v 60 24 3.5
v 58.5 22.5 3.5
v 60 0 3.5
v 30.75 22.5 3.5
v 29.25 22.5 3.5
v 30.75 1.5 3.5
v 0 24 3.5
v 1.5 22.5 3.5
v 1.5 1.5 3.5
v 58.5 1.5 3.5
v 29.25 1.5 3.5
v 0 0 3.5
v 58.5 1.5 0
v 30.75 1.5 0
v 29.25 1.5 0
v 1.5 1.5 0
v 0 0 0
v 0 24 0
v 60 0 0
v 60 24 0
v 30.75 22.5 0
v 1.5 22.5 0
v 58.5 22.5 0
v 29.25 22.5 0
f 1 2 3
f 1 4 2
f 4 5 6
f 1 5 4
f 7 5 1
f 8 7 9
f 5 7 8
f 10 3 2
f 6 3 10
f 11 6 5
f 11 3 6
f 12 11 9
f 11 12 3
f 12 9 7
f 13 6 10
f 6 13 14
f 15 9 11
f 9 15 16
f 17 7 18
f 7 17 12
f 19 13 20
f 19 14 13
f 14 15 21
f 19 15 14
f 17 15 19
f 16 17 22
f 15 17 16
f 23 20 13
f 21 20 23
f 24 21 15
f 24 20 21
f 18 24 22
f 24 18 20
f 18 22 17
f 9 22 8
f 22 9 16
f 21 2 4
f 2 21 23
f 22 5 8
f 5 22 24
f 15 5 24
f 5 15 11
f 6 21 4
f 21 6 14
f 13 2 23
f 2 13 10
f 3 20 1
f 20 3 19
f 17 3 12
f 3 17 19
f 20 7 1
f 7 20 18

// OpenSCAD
//Draw Allted's Simple CNC Table based on input dimensions using openscad
//Translated into openscad on 4/4/2016  by: David Bunch
//
//The default dimensions are what I am using for a table, 48"Long x 36"Wide x 30"High
//This is drawn in Inches, set ScaleFactor variable to 25.4 to draw in millimeters
//Rev2 - revised for Quantity of Top Ledge Lengths if only 1 middle stiffener used
//Rev3 - Legs, Top Ledges & Shelf Ledges can be different Widths & thickness now
//       I made this change because I want to use 2x3's for the Shelf ledges
//Rev4 - Display Shelf Usable Heights with a visual cube for each shelf
//CUSTOMIZER VARIABLES
//If you want your MPCNC corners to be right at corners of table,
//Set Len & Wid the same as your CNC_LEN & CNC_Wid
WorkBenchLength = 5*12;                   //Length of Table
WorkBenchDepth = 24;                      //Width of Table
BoardWidth = 3.5;          //Width Legs (I am using 2x4)
BoardThickness = 1.5;   



RailLength = WorkBenchLength;
BeamLength = WorkBenchDepth-(2*BoardThickness);
NumberOfTopSupportBeams = 1; //Number of Beams for support


Caster_Height = 4;           //how tall are your casters
Total_Height = 36;           //Total height of the table (Including casters)
Ht = Total_Height - Caster_Height;                    //Height of Table at top of Ledges


module Draw2by4(boardLength)
{
    cube([boardLength,BoardThickness,BoardWidth]);
}

module DrawBeams(numBeams)
{
    color("green")
    {   
        totalBeams = 2 + numBeams;  //Account for "end" beams along with addition beams in between(numBeans)

        echo(str("** Total Beams: " , totalBeams));
        echo(str("** Rail Length: ", RailLength));
        echo(str("** Beam Step: ", RailLength / (totalBeams - 1)));

        for(currentPosition = [BoardThickness: (RailLength - BoardThickness) / (totalBeams - 1) :RailLength + BoardThickness])
            {
                echo(str("** Current Beam Position: " , currentPosition));
                
                translate([currentPosition,BoardThickness,0])
                    rotate([0,0,90])
                        Draw2by4(BeamLength);
            }
    }
}

module DrawTop()
{
    Draw2by4(WorkBenchLength);
    translate([0,BeamLength+BoardThickness,0])
    Draw2by4(WorkBenchLength);
    
    DrawBeams(NumberOfTopSupportBeams);

}

DrawTop();
